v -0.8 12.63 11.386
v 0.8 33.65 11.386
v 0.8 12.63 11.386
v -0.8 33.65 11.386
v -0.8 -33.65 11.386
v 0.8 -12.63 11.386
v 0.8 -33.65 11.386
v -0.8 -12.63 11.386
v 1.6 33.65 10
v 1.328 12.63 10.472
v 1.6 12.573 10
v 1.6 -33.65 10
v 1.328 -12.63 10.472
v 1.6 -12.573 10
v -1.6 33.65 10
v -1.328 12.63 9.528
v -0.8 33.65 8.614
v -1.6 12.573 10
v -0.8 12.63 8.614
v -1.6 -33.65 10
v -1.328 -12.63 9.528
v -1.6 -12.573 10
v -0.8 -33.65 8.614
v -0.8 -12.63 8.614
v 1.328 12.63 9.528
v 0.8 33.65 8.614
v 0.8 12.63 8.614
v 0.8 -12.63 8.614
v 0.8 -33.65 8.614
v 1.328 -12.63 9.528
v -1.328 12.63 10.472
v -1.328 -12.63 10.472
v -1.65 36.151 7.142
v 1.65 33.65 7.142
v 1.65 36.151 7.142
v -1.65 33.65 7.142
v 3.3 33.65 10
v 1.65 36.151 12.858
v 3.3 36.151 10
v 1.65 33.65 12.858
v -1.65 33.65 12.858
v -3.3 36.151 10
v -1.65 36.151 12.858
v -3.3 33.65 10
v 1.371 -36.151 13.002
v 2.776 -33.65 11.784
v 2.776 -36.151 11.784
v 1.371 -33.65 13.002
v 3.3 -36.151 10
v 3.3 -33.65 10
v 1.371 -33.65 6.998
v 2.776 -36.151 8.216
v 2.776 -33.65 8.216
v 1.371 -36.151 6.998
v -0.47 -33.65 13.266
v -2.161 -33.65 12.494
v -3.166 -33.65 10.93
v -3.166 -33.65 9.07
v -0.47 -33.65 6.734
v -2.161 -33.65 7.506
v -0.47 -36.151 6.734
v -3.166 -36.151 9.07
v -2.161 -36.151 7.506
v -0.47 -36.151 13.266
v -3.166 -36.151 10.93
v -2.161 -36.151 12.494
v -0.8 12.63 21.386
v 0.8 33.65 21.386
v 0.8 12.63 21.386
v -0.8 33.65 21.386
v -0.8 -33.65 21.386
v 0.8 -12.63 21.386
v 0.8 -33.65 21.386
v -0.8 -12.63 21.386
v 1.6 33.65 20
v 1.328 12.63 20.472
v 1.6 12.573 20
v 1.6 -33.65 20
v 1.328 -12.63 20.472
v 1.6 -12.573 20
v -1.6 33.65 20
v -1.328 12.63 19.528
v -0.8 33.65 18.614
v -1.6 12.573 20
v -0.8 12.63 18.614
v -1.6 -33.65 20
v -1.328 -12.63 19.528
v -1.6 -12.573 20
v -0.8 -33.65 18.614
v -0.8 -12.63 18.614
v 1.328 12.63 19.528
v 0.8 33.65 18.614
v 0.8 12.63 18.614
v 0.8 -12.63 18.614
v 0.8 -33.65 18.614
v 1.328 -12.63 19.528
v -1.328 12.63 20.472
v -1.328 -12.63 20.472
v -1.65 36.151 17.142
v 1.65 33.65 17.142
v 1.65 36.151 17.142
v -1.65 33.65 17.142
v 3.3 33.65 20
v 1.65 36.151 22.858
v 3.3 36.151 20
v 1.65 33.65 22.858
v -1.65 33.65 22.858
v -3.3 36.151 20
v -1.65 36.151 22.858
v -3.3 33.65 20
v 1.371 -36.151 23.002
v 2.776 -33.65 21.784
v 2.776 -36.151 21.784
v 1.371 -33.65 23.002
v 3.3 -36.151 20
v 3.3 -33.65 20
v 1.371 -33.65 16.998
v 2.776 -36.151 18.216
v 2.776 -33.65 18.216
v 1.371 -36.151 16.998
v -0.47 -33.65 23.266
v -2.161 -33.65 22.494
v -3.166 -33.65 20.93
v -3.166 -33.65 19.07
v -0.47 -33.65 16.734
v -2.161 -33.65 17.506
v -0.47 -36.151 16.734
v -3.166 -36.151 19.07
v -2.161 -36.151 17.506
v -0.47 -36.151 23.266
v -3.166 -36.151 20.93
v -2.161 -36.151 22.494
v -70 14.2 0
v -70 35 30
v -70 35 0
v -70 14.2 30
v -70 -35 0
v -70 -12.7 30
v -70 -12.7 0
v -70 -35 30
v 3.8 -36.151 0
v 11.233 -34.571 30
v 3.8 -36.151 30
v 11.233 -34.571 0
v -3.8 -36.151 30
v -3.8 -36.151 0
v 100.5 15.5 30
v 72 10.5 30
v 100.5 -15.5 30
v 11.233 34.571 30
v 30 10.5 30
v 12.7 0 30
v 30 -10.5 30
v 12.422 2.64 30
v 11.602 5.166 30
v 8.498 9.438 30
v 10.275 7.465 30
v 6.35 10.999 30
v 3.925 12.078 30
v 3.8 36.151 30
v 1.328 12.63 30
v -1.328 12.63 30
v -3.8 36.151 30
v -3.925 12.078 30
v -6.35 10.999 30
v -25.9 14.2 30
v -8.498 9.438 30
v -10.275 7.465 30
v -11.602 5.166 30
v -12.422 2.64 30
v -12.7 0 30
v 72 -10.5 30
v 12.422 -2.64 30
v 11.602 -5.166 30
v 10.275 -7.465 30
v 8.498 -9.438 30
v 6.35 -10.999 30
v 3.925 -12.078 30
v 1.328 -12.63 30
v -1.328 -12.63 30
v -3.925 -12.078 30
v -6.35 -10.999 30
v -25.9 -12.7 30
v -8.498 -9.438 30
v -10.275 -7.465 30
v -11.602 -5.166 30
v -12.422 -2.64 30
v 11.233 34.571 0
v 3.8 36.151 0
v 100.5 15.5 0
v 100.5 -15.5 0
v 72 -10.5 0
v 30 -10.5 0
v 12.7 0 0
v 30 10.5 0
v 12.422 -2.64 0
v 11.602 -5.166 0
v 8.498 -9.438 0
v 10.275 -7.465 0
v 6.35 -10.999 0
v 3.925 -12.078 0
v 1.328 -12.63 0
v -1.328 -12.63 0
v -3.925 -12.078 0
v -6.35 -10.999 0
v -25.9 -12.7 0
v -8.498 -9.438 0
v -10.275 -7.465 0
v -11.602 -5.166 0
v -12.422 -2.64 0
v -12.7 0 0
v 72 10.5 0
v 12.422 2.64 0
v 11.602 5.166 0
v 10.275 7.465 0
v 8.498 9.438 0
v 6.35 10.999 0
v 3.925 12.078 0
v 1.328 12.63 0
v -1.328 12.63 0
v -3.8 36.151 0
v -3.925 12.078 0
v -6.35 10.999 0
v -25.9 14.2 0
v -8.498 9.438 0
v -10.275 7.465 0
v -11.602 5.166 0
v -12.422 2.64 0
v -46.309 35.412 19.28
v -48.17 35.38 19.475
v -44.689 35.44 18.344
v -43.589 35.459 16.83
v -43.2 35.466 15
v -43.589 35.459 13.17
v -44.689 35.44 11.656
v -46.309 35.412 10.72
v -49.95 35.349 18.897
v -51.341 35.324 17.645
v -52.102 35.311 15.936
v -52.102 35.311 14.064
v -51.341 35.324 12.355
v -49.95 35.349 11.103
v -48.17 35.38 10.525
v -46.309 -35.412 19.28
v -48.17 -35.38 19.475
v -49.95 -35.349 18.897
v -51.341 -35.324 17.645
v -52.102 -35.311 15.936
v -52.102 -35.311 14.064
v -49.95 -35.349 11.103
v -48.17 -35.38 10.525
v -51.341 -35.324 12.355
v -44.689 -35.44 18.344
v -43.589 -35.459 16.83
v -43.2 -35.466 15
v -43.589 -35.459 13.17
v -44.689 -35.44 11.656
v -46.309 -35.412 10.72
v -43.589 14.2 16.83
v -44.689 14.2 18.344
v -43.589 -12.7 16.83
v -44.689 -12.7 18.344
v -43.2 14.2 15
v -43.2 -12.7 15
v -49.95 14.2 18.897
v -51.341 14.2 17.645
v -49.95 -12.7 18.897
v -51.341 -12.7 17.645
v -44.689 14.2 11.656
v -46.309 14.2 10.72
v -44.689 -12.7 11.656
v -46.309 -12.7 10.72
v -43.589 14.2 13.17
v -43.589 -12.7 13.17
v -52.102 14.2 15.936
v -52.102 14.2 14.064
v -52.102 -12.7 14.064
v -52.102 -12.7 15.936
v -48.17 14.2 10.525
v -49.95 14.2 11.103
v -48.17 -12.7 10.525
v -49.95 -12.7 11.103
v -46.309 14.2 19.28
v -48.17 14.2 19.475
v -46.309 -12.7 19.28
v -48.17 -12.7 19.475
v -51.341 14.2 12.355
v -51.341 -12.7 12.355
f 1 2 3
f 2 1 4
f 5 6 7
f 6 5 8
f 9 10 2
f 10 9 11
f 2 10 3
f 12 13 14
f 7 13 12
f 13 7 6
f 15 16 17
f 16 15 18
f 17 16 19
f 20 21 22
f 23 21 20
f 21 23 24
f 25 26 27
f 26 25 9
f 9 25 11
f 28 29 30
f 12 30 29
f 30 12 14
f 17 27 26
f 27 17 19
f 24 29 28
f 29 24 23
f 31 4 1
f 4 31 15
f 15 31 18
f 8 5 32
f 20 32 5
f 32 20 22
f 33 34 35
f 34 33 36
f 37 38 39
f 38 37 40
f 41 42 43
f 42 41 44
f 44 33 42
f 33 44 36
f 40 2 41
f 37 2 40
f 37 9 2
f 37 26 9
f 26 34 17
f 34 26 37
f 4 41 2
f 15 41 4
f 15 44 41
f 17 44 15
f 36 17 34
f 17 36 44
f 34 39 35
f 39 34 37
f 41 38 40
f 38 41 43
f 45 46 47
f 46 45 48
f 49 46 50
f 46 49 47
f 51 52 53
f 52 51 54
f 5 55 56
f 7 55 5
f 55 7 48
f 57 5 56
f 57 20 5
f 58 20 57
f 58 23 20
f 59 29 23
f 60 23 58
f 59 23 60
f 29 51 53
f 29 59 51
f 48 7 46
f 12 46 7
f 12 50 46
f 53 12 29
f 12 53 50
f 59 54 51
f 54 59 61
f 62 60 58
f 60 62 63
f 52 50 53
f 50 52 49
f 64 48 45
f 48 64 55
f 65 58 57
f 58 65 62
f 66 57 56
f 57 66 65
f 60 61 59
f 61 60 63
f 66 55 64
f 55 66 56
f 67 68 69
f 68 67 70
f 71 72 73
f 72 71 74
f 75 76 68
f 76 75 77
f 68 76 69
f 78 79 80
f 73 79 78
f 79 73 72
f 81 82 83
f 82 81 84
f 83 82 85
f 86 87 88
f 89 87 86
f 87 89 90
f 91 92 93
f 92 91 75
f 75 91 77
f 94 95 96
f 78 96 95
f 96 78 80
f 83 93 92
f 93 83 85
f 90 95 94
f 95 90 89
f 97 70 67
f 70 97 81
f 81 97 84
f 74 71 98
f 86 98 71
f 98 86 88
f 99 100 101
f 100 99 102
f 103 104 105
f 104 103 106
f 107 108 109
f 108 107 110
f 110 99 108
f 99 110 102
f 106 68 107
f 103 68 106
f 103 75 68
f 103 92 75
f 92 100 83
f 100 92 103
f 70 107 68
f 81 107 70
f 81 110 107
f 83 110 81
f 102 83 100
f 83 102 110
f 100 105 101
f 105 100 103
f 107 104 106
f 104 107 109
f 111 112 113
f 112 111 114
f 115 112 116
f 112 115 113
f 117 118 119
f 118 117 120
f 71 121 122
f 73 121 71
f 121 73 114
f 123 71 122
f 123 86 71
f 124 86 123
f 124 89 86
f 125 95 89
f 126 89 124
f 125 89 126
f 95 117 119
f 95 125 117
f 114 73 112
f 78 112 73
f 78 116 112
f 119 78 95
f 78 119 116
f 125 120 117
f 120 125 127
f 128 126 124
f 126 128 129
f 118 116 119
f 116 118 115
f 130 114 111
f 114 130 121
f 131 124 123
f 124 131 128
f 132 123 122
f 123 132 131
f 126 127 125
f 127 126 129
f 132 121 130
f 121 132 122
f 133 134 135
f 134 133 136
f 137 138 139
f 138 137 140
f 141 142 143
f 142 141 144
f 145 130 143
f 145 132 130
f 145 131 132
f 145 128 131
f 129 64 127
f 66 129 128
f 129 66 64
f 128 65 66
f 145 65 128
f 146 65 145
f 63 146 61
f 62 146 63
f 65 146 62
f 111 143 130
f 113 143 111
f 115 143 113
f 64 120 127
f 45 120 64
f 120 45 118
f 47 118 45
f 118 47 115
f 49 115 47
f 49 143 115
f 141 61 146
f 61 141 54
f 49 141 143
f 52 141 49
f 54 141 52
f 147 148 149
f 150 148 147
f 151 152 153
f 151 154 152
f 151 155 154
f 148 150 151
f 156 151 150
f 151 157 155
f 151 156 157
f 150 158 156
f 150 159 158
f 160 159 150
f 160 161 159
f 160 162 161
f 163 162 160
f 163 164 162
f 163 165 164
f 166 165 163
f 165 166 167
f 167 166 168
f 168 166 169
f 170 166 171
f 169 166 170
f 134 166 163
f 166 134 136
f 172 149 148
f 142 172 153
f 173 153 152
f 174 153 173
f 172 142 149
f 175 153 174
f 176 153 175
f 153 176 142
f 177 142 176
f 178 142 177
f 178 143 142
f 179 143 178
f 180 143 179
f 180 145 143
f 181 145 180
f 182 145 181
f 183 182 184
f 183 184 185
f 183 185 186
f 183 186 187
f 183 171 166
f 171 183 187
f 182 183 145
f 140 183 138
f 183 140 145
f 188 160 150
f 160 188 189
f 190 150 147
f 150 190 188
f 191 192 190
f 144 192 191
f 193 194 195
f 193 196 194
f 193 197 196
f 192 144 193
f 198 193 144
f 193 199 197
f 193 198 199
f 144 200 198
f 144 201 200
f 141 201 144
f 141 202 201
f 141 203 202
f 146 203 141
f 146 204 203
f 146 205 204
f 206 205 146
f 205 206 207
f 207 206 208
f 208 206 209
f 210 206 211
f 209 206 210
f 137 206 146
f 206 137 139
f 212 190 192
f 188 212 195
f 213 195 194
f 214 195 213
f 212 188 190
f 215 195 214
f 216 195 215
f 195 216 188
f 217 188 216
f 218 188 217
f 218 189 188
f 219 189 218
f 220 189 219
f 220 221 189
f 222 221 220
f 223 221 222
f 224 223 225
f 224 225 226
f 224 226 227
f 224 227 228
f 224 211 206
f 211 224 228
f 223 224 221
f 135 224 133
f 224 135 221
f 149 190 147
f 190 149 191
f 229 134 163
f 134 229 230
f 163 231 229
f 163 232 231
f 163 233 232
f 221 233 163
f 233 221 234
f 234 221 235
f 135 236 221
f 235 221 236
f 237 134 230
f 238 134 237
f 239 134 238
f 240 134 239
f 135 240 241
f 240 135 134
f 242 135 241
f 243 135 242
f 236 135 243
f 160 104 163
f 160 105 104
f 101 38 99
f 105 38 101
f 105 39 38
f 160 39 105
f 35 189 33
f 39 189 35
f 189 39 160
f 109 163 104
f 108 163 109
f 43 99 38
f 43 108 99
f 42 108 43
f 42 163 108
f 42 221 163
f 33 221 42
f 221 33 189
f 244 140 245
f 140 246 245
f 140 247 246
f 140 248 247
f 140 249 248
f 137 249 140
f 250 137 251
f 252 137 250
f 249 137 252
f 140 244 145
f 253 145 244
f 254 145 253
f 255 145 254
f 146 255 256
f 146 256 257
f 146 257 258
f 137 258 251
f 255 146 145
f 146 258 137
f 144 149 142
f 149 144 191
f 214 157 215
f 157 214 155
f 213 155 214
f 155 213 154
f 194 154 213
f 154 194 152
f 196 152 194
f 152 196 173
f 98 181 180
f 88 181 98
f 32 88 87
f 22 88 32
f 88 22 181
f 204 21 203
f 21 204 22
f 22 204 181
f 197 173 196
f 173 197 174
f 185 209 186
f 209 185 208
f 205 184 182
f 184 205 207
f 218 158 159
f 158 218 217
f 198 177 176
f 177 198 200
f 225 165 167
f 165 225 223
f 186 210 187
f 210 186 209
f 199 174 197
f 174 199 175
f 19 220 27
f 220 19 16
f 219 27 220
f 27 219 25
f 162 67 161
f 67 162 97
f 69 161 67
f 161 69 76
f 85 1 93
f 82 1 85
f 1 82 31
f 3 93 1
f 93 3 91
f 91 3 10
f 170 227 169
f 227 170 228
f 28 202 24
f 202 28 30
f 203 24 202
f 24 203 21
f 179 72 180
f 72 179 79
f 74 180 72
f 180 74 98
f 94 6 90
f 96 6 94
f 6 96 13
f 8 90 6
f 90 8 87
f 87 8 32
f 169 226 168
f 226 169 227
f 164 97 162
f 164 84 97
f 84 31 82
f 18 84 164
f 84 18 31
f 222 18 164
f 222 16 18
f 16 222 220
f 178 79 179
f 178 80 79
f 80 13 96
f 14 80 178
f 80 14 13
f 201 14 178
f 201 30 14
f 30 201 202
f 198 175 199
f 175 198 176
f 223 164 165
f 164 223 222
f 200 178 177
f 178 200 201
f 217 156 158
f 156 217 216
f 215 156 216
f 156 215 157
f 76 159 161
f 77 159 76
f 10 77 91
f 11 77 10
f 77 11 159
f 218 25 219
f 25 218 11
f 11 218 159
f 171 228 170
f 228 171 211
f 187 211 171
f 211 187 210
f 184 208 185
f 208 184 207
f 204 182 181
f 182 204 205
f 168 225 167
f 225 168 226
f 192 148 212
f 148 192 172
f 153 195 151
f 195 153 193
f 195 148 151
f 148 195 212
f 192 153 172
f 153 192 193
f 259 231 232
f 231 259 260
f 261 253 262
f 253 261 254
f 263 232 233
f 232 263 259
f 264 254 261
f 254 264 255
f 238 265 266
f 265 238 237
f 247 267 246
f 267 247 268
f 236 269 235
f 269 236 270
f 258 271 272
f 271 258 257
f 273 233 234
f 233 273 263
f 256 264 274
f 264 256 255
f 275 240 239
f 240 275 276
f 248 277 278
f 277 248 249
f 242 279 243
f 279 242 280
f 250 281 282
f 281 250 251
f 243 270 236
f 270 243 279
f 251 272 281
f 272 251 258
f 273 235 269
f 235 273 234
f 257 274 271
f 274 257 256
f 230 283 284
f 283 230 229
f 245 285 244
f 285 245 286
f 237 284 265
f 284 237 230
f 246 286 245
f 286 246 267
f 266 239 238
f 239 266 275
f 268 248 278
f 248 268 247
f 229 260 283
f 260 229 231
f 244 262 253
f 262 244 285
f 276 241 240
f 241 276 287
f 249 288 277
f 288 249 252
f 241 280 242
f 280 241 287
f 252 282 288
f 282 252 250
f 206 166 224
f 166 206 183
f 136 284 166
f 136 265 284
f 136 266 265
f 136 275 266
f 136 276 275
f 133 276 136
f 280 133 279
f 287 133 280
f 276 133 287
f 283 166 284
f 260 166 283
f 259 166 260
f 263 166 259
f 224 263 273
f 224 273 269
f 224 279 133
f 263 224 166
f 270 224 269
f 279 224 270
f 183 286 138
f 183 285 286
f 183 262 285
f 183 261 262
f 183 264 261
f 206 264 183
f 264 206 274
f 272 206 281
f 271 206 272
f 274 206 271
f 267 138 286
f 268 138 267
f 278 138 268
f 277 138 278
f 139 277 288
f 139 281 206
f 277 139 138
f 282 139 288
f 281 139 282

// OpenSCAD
include <../Parameters.scad>


g2_5_height = 30;
g2_5_width = 70;
g2_5_threads = 2; // kolik ma byt sroubu skrz nosnou tyc

g2_5_m3_length = 70; // sroub, ktery se pouziva na sesroubovani s nosnou tyci
g2_5_servo_shift = 30; 
g2_5_servo_wall = 5;

g2_5_m8_length = 60; // sroub, ktery se pouziva jako osa pro podlozku
g2_5_front_l = main_tube_outer_diameter + 608_bearing_outer_diameter*2;// jak moc ma byt magnet v predu

g2_5_zapusteni_serva = 30;
g2_5_length = g2_5_zapusteni_serva + 2*main_tube_outer_diameter + 30;
g2_5_length_offset = -10;

width_real = g2_5_m3_length + M3_nut_height;
width_magnet = g2_5_m8_length + 11 + 5;

module 888_2005(draft = true){
    radius=main_tube_outer_diameter/2;
    
    difference(){
        union(){
            //translate([-g2_5_length/2+g2_5_length_offset,-g2_5_width/2,0]) cube([g2_5_length, g2_5_width, g2_5_height]);
            hull(){
                    cylinder(h=g2_5_height, d = width_real);
                    translate([g2_5_m3_length+g2_5_zapusteni_serva, -(servo_20kg_width+g2_5_servo_wall*2)/2, 0]) cube([global_clearance, servo_20kg_width+2*g2_5_servo_wall, g2_5_height]);
                    #translate([-g2_5_front_l, -(g2_5_m3_length)/2, 0]) cube([global_clearance, g2_5_m3_length, g2_5_height]);
            }
        }
        
        // hlavni nosna tyc
        translate([0,0,-global_clearance/2]) cylinder(r=radius, h=g2_5_height+global_clearance);
        
        // diry pro M3 srouby do hlavni tyce
        for (i = [1:g2_5_threads]){
            dif = g2_5_height/(g2_5_threads+1);    
            translate([0, width_real/2, dif*i]) rotate([90, 0, 0]) cylinder(h=width_real, d=M3_screw_diameter);
            translate([0, width_real/2, dif*i]) rotate([90, 0, 0]) cylinder(h=M3_nut_height, d=M3_nut_diameter, $fn=6);
            translate([0, -width_real/2+M3_nut_height, dif*i]) rotate([90, 0, 0]) cylinder(h=M3_nut_height, d=M3_nut_diameter);
        }
        
        //hlavni dira pro servo
       translate([g2_5_servo_shift, -servo_20kg_width/2, 0]) cube([servo_20kg_height, servo_20kg_width, g2_5_height ]);
        
        // dira pro osu do loziska
        translate([-g2_5_front_l+608_bearing_outer_diameter*1, width_magnet/2, g2_5_height/2]) rotate([90, 0, 0]) cylinder(h=width_magnet+1, d=M8_screw_diameter);
        //dira pro dil s loziskem
        translate([-g2_5_front_l, -radius, 0]) cube([608_bearing_outer_diameter*2-global_clearance, main_tube_outer_diameter+1.5, g2_5_height]);
    }
}

888_2005();
